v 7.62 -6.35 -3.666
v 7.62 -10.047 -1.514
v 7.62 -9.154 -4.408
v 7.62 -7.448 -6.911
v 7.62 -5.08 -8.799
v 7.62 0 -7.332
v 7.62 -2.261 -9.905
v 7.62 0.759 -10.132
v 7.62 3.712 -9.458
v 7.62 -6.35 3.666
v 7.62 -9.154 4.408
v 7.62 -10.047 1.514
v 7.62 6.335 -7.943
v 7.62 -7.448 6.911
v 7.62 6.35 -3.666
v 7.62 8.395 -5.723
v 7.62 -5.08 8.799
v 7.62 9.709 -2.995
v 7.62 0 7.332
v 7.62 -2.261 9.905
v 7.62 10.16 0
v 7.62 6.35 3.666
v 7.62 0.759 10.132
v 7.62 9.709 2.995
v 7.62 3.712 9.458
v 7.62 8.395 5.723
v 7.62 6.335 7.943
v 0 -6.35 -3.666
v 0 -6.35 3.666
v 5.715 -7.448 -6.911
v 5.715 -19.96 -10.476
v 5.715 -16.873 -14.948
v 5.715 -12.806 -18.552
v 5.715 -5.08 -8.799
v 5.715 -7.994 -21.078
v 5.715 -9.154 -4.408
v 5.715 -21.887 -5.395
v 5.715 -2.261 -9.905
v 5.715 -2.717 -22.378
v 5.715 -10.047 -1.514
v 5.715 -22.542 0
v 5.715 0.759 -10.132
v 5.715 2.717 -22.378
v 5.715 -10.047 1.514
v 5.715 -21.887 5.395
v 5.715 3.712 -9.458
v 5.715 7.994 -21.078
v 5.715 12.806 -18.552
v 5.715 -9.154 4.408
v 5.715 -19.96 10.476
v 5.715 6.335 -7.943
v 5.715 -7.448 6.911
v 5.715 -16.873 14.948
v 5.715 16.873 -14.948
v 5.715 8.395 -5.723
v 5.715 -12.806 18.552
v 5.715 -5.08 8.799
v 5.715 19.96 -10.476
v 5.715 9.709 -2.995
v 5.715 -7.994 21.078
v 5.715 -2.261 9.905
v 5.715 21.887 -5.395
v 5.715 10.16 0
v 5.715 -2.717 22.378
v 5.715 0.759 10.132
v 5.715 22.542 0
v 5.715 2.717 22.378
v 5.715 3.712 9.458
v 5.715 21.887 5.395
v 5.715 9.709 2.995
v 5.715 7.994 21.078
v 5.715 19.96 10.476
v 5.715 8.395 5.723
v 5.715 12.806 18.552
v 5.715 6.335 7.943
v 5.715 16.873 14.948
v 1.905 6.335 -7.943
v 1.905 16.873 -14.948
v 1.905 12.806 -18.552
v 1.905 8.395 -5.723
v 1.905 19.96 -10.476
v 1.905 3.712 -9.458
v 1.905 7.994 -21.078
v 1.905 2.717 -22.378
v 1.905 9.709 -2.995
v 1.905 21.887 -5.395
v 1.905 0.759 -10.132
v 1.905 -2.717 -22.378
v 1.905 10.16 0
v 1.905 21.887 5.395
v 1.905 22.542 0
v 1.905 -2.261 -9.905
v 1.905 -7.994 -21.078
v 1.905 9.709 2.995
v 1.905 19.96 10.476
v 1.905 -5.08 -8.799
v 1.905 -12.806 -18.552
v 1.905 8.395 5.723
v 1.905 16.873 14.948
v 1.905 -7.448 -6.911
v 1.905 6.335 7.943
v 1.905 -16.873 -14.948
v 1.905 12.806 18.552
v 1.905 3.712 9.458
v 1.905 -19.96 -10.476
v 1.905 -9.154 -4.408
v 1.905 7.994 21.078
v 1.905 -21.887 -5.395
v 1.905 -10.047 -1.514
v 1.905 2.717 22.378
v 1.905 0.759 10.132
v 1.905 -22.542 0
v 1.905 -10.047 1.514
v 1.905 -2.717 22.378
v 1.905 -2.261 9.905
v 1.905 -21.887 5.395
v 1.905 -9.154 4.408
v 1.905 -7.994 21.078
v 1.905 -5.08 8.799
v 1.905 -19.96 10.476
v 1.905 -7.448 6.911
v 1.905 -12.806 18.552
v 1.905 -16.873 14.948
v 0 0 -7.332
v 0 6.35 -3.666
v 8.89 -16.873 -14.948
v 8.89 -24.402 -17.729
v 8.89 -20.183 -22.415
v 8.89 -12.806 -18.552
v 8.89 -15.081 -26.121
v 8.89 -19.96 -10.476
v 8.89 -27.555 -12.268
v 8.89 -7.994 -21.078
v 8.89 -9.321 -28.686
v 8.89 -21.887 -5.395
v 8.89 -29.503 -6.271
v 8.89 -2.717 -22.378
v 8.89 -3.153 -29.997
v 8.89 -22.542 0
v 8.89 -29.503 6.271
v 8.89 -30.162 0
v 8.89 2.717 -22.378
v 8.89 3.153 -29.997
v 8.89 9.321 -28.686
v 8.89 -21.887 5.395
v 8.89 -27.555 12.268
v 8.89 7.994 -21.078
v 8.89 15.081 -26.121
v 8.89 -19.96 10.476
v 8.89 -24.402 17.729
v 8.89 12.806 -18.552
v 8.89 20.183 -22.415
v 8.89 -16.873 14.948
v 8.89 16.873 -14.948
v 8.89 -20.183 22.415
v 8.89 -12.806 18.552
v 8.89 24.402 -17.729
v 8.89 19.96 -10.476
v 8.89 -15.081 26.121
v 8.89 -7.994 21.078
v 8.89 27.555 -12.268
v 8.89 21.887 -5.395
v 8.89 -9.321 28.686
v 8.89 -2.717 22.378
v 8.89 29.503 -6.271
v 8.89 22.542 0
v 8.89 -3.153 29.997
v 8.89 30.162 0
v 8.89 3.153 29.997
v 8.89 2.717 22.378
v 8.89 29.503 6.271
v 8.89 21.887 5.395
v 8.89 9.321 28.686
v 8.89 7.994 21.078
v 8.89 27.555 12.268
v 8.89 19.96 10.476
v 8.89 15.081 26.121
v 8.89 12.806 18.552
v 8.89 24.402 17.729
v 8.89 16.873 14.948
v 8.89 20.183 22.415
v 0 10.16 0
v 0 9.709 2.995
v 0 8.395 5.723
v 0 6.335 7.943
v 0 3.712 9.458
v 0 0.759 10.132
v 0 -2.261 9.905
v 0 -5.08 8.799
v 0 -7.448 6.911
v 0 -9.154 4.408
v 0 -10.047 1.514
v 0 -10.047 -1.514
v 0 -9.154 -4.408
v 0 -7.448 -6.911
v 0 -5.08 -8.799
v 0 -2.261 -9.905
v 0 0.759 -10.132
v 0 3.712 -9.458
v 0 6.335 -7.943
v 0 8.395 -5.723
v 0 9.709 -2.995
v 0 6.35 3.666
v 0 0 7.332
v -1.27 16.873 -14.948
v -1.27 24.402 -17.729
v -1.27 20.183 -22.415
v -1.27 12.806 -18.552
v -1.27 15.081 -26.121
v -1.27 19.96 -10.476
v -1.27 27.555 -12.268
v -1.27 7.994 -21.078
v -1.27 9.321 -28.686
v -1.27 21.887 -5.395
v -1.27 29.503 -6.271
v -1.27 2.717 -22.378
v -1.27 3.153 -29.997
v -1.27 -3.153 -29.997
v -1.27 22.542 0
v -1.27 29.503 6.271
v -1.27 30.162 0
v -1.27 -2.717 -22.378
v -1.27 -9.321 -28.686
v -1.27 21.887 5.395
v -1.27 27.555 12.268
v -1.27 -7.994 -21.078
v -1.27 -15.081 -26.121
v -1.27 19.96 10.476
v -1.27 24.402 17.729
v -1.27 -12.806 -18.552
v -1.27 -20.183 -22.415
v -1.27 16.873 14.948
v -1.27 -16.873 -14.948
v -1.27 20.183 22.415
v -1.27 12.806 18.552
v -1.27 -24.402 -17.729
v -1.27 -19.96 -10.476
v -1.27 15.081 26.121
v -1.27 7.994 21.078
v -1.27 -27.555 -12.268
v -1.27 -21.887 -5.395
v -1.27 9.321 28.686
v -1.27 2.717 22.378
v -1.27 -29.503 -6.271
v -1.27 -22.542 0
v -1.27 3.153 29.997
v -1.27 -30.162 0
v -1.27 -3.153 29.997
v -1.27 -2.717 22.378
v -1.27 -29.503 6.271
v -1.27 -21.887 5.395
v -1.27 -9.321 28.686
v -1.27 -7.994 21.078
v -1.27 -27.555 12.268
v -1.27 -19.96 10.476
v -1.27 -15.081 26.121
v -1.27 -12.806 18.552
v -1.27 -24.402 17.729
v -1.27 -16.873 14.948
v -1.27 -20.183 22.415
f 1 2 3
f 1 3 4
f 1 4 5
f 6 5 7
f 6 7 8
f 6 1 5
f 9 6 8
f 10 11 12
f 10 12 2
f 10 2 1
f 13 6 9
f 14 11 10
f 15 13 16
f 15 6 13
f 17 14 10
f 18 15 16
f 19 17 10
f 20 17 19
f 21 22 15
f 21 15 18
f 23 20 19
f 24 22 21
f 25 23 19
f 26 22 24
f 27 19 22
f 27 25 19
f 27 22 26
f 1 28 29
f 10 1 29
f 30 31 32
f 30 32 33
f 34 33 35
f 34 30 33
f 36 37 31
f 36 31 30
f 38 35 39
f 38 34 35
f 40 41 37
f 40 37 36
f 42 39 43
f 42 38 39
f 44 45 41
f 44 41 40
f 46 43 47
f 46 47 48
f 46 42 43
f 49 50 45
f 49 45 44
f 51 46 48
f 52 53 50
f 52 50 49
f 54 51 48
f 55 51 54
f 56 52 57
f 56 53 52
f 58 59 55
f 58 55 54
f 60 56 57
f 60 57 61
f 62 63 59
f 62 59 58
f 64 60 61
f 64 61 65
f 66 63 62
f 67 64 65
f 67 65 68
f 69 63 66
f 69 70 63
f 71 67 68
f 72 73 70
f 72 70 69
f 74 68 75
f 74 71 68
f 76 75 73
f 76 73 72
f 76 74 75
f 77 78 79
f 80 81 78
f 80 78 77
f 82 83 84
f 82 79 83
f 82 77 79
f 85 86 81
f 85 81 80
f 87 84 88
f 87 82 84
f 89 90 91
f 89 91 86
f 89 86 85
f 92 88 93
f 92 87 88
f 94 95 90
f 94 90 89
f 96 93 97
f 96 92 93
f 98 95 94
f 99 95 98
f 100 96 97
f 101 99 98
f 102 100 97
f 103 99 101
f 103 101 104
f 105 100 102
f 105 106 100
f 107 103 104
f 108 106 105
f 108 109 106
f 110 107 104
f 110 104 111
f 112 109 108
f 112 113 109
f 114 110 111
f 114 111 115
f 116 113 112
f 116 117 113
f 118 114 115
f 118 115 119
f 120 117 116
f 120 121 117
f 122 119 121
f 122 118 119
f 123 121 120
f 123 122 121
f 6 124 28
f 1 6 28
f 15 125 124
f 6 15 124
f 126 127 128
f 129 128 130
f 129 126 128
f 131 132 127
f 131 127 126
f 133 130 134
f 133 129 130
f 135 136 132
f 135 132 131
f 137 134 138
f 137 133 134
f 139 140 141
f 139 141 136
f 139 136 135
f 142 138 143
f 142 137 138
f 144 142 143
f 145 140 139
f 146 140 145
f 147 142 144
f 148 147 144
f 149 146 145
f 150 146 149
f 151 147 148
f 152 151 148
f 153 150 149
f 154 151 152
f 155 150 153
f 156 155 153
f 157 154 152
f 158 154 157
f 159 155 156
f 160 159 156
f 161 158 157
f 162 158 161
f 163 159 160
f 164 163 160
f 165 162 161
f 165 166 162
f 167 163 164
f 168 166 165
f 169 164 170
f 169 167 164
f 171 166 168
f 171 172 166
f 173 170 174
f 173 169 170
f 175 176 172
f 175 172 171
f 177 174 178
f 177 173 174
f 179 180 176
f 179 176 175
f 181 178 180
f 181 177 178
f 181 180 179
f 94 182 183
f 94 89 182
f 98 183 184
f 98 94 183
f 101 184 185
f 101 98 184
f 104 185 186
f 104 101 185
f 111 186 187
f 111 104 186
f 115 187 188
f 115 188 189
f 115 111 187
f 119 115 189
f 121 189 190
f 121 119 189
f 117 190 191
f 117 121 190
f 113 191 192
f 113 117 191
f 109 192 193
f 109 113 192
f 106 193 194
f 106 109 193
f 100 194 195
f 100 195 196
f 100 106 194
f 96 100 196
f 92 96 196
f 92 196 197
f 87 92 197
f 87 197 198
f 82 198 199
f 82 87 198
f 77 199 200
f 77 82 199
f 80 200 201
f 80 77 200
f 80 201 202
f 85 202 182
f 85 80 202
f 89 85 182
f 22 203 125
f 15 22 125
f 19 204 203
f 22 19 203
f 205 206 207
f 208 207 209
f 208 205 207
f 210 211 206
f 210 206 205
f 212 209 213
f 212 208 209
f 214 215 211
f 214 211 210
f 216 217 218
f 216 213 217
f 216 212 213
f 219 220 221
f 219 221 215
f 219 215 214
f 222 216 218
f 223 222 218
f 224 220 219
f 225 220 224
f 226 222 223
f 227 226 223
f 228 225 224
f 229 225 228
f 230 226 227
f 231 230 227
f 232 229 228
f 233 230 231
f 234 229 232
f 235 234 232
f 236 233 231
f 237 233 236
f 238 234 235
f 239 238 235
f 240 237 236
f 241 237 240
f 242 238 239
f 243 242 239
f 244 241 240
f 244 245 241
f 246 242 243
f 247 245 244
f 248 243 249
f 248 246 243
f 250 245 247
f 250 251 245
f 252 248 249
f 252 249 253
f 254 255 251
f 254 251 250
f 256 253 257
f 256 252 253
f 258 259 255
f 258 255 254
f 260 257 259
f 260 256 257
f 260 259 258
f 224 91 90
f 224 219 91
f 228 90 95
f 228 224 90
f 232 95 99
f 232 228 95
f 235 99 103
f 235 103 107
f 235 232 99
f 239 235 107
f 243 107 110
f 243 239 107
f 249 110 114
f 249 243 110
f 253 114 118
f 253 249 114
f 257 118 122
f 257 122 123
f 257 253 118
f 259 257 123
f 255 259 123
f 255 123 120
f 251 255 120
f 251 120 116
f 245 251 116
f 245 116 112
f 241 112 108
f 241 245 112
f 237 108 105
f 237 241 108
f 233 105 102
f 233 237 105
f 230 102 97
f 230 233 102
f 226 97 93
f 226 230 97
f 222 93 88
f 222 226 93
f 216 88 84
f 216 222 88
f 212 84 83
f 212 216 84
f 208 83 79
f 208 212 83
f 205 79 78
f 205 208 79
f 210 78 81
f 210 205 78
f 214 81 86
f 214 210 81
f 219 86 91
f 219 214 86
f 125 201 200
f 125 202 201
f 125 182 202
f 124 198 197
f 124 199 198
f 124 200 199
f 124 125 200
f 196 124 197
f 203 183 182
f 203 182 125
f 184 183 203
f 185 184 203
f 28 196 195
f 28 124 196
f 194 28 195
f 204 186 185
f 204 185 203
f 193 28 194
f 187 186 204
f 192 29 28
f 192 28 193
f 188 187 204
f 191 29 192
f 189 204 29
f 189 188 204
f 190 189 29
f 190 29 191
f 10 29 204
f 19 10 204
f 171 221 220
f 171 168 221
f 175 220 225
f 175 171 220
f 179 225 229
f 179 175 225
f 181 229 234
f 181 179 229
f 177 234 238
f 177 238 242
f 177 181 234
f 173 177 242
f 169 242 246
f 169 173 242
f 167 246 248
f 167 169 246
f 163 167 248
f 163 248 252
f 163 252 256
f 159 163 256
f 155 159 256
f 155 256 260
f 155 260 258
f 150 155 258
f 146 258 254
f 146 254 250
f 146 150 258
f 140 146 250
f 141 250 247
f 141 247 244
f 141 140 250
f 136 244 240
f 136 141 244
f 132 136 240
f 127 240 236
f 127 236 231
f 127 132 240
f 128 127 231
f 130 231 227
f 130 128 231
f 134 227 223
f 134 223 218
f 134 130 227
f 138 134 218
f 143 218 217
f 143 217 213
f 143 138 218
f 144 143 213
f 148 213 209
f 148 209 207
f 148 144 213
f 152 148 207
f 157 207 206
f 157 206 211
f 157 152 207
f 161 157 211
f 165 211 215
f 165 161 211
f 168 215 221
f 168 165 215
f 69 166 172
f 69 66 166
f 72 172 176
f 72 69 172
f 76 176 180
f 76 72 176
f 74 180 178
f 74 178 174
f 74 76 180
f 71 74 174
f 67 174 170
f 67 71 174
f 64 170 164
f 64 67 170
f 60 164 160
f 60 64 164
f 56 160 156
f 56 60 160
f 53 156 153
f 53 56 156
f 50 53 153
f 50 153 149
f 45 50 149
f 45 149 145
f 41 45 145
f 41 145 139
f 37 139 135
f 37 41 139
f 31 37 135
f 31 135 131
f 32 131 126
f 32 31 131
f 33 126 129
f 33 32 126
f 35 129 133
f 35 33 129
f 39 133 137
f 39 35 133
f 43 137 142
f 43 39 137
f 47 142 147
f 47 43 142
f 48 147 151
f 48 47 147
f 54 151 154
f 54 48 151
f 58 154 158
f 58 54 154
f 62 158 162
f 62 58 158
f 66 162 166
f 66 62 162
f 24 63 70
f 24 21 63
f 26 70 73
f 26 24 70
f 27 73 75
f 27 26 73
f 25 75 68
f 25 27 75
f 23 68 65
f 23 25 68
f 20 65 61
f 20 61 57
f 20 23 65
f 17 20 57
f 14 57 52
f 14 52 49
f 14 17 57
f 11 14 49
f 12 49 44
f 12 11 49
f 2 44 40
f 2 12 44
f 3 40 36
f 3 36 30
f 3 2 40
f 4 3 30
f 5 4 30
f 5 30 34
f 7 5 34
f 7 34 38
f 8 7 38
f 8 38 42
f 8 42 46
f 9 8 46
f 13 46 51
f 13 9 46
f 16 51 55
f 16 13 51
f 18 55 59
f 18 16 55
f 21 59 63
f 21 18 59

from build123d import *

# Parameters (mm, degrees)
POCKET_DEPTH = 8.891


with BuildPart() as part:
    # Sketch → Revolution (revolve)
    with BuildSketch(Plane.XY):
        Polygon((0, 0), (0, 10.16), (1.905, 10.16), (1.905, 22.5425), (-1.27, 22.5425), (-1.27, 30.1625), (8.89, 30.1625), (8.89, 22.5425), (5.715, 22.5425), (5.715, 10.16), (7.62, 10.16), (7.62, 0), align=None)
    revolve(axis=Axis((0, 0, 0), (1, 0, 0)))

    # Sketch001 (on Face1 of Revolution) → Pocket (cut, through all)
    with BuildSketch(Plane(origin=(0, 0, 0), x_dir=(0, -1, 0), z_dir=(-1, 0, 0))):
        Polygon((0, 7.332348), (-6.35, 3.666174), (-6.35, -3.666174), (0, -7.332348), (6.35, -3.666174), (6.35, 3.666174), align=None)
    extrude(amount=-POCKET_DEPTH, mode=Mode.SUBTRACT)


solid = part.part
